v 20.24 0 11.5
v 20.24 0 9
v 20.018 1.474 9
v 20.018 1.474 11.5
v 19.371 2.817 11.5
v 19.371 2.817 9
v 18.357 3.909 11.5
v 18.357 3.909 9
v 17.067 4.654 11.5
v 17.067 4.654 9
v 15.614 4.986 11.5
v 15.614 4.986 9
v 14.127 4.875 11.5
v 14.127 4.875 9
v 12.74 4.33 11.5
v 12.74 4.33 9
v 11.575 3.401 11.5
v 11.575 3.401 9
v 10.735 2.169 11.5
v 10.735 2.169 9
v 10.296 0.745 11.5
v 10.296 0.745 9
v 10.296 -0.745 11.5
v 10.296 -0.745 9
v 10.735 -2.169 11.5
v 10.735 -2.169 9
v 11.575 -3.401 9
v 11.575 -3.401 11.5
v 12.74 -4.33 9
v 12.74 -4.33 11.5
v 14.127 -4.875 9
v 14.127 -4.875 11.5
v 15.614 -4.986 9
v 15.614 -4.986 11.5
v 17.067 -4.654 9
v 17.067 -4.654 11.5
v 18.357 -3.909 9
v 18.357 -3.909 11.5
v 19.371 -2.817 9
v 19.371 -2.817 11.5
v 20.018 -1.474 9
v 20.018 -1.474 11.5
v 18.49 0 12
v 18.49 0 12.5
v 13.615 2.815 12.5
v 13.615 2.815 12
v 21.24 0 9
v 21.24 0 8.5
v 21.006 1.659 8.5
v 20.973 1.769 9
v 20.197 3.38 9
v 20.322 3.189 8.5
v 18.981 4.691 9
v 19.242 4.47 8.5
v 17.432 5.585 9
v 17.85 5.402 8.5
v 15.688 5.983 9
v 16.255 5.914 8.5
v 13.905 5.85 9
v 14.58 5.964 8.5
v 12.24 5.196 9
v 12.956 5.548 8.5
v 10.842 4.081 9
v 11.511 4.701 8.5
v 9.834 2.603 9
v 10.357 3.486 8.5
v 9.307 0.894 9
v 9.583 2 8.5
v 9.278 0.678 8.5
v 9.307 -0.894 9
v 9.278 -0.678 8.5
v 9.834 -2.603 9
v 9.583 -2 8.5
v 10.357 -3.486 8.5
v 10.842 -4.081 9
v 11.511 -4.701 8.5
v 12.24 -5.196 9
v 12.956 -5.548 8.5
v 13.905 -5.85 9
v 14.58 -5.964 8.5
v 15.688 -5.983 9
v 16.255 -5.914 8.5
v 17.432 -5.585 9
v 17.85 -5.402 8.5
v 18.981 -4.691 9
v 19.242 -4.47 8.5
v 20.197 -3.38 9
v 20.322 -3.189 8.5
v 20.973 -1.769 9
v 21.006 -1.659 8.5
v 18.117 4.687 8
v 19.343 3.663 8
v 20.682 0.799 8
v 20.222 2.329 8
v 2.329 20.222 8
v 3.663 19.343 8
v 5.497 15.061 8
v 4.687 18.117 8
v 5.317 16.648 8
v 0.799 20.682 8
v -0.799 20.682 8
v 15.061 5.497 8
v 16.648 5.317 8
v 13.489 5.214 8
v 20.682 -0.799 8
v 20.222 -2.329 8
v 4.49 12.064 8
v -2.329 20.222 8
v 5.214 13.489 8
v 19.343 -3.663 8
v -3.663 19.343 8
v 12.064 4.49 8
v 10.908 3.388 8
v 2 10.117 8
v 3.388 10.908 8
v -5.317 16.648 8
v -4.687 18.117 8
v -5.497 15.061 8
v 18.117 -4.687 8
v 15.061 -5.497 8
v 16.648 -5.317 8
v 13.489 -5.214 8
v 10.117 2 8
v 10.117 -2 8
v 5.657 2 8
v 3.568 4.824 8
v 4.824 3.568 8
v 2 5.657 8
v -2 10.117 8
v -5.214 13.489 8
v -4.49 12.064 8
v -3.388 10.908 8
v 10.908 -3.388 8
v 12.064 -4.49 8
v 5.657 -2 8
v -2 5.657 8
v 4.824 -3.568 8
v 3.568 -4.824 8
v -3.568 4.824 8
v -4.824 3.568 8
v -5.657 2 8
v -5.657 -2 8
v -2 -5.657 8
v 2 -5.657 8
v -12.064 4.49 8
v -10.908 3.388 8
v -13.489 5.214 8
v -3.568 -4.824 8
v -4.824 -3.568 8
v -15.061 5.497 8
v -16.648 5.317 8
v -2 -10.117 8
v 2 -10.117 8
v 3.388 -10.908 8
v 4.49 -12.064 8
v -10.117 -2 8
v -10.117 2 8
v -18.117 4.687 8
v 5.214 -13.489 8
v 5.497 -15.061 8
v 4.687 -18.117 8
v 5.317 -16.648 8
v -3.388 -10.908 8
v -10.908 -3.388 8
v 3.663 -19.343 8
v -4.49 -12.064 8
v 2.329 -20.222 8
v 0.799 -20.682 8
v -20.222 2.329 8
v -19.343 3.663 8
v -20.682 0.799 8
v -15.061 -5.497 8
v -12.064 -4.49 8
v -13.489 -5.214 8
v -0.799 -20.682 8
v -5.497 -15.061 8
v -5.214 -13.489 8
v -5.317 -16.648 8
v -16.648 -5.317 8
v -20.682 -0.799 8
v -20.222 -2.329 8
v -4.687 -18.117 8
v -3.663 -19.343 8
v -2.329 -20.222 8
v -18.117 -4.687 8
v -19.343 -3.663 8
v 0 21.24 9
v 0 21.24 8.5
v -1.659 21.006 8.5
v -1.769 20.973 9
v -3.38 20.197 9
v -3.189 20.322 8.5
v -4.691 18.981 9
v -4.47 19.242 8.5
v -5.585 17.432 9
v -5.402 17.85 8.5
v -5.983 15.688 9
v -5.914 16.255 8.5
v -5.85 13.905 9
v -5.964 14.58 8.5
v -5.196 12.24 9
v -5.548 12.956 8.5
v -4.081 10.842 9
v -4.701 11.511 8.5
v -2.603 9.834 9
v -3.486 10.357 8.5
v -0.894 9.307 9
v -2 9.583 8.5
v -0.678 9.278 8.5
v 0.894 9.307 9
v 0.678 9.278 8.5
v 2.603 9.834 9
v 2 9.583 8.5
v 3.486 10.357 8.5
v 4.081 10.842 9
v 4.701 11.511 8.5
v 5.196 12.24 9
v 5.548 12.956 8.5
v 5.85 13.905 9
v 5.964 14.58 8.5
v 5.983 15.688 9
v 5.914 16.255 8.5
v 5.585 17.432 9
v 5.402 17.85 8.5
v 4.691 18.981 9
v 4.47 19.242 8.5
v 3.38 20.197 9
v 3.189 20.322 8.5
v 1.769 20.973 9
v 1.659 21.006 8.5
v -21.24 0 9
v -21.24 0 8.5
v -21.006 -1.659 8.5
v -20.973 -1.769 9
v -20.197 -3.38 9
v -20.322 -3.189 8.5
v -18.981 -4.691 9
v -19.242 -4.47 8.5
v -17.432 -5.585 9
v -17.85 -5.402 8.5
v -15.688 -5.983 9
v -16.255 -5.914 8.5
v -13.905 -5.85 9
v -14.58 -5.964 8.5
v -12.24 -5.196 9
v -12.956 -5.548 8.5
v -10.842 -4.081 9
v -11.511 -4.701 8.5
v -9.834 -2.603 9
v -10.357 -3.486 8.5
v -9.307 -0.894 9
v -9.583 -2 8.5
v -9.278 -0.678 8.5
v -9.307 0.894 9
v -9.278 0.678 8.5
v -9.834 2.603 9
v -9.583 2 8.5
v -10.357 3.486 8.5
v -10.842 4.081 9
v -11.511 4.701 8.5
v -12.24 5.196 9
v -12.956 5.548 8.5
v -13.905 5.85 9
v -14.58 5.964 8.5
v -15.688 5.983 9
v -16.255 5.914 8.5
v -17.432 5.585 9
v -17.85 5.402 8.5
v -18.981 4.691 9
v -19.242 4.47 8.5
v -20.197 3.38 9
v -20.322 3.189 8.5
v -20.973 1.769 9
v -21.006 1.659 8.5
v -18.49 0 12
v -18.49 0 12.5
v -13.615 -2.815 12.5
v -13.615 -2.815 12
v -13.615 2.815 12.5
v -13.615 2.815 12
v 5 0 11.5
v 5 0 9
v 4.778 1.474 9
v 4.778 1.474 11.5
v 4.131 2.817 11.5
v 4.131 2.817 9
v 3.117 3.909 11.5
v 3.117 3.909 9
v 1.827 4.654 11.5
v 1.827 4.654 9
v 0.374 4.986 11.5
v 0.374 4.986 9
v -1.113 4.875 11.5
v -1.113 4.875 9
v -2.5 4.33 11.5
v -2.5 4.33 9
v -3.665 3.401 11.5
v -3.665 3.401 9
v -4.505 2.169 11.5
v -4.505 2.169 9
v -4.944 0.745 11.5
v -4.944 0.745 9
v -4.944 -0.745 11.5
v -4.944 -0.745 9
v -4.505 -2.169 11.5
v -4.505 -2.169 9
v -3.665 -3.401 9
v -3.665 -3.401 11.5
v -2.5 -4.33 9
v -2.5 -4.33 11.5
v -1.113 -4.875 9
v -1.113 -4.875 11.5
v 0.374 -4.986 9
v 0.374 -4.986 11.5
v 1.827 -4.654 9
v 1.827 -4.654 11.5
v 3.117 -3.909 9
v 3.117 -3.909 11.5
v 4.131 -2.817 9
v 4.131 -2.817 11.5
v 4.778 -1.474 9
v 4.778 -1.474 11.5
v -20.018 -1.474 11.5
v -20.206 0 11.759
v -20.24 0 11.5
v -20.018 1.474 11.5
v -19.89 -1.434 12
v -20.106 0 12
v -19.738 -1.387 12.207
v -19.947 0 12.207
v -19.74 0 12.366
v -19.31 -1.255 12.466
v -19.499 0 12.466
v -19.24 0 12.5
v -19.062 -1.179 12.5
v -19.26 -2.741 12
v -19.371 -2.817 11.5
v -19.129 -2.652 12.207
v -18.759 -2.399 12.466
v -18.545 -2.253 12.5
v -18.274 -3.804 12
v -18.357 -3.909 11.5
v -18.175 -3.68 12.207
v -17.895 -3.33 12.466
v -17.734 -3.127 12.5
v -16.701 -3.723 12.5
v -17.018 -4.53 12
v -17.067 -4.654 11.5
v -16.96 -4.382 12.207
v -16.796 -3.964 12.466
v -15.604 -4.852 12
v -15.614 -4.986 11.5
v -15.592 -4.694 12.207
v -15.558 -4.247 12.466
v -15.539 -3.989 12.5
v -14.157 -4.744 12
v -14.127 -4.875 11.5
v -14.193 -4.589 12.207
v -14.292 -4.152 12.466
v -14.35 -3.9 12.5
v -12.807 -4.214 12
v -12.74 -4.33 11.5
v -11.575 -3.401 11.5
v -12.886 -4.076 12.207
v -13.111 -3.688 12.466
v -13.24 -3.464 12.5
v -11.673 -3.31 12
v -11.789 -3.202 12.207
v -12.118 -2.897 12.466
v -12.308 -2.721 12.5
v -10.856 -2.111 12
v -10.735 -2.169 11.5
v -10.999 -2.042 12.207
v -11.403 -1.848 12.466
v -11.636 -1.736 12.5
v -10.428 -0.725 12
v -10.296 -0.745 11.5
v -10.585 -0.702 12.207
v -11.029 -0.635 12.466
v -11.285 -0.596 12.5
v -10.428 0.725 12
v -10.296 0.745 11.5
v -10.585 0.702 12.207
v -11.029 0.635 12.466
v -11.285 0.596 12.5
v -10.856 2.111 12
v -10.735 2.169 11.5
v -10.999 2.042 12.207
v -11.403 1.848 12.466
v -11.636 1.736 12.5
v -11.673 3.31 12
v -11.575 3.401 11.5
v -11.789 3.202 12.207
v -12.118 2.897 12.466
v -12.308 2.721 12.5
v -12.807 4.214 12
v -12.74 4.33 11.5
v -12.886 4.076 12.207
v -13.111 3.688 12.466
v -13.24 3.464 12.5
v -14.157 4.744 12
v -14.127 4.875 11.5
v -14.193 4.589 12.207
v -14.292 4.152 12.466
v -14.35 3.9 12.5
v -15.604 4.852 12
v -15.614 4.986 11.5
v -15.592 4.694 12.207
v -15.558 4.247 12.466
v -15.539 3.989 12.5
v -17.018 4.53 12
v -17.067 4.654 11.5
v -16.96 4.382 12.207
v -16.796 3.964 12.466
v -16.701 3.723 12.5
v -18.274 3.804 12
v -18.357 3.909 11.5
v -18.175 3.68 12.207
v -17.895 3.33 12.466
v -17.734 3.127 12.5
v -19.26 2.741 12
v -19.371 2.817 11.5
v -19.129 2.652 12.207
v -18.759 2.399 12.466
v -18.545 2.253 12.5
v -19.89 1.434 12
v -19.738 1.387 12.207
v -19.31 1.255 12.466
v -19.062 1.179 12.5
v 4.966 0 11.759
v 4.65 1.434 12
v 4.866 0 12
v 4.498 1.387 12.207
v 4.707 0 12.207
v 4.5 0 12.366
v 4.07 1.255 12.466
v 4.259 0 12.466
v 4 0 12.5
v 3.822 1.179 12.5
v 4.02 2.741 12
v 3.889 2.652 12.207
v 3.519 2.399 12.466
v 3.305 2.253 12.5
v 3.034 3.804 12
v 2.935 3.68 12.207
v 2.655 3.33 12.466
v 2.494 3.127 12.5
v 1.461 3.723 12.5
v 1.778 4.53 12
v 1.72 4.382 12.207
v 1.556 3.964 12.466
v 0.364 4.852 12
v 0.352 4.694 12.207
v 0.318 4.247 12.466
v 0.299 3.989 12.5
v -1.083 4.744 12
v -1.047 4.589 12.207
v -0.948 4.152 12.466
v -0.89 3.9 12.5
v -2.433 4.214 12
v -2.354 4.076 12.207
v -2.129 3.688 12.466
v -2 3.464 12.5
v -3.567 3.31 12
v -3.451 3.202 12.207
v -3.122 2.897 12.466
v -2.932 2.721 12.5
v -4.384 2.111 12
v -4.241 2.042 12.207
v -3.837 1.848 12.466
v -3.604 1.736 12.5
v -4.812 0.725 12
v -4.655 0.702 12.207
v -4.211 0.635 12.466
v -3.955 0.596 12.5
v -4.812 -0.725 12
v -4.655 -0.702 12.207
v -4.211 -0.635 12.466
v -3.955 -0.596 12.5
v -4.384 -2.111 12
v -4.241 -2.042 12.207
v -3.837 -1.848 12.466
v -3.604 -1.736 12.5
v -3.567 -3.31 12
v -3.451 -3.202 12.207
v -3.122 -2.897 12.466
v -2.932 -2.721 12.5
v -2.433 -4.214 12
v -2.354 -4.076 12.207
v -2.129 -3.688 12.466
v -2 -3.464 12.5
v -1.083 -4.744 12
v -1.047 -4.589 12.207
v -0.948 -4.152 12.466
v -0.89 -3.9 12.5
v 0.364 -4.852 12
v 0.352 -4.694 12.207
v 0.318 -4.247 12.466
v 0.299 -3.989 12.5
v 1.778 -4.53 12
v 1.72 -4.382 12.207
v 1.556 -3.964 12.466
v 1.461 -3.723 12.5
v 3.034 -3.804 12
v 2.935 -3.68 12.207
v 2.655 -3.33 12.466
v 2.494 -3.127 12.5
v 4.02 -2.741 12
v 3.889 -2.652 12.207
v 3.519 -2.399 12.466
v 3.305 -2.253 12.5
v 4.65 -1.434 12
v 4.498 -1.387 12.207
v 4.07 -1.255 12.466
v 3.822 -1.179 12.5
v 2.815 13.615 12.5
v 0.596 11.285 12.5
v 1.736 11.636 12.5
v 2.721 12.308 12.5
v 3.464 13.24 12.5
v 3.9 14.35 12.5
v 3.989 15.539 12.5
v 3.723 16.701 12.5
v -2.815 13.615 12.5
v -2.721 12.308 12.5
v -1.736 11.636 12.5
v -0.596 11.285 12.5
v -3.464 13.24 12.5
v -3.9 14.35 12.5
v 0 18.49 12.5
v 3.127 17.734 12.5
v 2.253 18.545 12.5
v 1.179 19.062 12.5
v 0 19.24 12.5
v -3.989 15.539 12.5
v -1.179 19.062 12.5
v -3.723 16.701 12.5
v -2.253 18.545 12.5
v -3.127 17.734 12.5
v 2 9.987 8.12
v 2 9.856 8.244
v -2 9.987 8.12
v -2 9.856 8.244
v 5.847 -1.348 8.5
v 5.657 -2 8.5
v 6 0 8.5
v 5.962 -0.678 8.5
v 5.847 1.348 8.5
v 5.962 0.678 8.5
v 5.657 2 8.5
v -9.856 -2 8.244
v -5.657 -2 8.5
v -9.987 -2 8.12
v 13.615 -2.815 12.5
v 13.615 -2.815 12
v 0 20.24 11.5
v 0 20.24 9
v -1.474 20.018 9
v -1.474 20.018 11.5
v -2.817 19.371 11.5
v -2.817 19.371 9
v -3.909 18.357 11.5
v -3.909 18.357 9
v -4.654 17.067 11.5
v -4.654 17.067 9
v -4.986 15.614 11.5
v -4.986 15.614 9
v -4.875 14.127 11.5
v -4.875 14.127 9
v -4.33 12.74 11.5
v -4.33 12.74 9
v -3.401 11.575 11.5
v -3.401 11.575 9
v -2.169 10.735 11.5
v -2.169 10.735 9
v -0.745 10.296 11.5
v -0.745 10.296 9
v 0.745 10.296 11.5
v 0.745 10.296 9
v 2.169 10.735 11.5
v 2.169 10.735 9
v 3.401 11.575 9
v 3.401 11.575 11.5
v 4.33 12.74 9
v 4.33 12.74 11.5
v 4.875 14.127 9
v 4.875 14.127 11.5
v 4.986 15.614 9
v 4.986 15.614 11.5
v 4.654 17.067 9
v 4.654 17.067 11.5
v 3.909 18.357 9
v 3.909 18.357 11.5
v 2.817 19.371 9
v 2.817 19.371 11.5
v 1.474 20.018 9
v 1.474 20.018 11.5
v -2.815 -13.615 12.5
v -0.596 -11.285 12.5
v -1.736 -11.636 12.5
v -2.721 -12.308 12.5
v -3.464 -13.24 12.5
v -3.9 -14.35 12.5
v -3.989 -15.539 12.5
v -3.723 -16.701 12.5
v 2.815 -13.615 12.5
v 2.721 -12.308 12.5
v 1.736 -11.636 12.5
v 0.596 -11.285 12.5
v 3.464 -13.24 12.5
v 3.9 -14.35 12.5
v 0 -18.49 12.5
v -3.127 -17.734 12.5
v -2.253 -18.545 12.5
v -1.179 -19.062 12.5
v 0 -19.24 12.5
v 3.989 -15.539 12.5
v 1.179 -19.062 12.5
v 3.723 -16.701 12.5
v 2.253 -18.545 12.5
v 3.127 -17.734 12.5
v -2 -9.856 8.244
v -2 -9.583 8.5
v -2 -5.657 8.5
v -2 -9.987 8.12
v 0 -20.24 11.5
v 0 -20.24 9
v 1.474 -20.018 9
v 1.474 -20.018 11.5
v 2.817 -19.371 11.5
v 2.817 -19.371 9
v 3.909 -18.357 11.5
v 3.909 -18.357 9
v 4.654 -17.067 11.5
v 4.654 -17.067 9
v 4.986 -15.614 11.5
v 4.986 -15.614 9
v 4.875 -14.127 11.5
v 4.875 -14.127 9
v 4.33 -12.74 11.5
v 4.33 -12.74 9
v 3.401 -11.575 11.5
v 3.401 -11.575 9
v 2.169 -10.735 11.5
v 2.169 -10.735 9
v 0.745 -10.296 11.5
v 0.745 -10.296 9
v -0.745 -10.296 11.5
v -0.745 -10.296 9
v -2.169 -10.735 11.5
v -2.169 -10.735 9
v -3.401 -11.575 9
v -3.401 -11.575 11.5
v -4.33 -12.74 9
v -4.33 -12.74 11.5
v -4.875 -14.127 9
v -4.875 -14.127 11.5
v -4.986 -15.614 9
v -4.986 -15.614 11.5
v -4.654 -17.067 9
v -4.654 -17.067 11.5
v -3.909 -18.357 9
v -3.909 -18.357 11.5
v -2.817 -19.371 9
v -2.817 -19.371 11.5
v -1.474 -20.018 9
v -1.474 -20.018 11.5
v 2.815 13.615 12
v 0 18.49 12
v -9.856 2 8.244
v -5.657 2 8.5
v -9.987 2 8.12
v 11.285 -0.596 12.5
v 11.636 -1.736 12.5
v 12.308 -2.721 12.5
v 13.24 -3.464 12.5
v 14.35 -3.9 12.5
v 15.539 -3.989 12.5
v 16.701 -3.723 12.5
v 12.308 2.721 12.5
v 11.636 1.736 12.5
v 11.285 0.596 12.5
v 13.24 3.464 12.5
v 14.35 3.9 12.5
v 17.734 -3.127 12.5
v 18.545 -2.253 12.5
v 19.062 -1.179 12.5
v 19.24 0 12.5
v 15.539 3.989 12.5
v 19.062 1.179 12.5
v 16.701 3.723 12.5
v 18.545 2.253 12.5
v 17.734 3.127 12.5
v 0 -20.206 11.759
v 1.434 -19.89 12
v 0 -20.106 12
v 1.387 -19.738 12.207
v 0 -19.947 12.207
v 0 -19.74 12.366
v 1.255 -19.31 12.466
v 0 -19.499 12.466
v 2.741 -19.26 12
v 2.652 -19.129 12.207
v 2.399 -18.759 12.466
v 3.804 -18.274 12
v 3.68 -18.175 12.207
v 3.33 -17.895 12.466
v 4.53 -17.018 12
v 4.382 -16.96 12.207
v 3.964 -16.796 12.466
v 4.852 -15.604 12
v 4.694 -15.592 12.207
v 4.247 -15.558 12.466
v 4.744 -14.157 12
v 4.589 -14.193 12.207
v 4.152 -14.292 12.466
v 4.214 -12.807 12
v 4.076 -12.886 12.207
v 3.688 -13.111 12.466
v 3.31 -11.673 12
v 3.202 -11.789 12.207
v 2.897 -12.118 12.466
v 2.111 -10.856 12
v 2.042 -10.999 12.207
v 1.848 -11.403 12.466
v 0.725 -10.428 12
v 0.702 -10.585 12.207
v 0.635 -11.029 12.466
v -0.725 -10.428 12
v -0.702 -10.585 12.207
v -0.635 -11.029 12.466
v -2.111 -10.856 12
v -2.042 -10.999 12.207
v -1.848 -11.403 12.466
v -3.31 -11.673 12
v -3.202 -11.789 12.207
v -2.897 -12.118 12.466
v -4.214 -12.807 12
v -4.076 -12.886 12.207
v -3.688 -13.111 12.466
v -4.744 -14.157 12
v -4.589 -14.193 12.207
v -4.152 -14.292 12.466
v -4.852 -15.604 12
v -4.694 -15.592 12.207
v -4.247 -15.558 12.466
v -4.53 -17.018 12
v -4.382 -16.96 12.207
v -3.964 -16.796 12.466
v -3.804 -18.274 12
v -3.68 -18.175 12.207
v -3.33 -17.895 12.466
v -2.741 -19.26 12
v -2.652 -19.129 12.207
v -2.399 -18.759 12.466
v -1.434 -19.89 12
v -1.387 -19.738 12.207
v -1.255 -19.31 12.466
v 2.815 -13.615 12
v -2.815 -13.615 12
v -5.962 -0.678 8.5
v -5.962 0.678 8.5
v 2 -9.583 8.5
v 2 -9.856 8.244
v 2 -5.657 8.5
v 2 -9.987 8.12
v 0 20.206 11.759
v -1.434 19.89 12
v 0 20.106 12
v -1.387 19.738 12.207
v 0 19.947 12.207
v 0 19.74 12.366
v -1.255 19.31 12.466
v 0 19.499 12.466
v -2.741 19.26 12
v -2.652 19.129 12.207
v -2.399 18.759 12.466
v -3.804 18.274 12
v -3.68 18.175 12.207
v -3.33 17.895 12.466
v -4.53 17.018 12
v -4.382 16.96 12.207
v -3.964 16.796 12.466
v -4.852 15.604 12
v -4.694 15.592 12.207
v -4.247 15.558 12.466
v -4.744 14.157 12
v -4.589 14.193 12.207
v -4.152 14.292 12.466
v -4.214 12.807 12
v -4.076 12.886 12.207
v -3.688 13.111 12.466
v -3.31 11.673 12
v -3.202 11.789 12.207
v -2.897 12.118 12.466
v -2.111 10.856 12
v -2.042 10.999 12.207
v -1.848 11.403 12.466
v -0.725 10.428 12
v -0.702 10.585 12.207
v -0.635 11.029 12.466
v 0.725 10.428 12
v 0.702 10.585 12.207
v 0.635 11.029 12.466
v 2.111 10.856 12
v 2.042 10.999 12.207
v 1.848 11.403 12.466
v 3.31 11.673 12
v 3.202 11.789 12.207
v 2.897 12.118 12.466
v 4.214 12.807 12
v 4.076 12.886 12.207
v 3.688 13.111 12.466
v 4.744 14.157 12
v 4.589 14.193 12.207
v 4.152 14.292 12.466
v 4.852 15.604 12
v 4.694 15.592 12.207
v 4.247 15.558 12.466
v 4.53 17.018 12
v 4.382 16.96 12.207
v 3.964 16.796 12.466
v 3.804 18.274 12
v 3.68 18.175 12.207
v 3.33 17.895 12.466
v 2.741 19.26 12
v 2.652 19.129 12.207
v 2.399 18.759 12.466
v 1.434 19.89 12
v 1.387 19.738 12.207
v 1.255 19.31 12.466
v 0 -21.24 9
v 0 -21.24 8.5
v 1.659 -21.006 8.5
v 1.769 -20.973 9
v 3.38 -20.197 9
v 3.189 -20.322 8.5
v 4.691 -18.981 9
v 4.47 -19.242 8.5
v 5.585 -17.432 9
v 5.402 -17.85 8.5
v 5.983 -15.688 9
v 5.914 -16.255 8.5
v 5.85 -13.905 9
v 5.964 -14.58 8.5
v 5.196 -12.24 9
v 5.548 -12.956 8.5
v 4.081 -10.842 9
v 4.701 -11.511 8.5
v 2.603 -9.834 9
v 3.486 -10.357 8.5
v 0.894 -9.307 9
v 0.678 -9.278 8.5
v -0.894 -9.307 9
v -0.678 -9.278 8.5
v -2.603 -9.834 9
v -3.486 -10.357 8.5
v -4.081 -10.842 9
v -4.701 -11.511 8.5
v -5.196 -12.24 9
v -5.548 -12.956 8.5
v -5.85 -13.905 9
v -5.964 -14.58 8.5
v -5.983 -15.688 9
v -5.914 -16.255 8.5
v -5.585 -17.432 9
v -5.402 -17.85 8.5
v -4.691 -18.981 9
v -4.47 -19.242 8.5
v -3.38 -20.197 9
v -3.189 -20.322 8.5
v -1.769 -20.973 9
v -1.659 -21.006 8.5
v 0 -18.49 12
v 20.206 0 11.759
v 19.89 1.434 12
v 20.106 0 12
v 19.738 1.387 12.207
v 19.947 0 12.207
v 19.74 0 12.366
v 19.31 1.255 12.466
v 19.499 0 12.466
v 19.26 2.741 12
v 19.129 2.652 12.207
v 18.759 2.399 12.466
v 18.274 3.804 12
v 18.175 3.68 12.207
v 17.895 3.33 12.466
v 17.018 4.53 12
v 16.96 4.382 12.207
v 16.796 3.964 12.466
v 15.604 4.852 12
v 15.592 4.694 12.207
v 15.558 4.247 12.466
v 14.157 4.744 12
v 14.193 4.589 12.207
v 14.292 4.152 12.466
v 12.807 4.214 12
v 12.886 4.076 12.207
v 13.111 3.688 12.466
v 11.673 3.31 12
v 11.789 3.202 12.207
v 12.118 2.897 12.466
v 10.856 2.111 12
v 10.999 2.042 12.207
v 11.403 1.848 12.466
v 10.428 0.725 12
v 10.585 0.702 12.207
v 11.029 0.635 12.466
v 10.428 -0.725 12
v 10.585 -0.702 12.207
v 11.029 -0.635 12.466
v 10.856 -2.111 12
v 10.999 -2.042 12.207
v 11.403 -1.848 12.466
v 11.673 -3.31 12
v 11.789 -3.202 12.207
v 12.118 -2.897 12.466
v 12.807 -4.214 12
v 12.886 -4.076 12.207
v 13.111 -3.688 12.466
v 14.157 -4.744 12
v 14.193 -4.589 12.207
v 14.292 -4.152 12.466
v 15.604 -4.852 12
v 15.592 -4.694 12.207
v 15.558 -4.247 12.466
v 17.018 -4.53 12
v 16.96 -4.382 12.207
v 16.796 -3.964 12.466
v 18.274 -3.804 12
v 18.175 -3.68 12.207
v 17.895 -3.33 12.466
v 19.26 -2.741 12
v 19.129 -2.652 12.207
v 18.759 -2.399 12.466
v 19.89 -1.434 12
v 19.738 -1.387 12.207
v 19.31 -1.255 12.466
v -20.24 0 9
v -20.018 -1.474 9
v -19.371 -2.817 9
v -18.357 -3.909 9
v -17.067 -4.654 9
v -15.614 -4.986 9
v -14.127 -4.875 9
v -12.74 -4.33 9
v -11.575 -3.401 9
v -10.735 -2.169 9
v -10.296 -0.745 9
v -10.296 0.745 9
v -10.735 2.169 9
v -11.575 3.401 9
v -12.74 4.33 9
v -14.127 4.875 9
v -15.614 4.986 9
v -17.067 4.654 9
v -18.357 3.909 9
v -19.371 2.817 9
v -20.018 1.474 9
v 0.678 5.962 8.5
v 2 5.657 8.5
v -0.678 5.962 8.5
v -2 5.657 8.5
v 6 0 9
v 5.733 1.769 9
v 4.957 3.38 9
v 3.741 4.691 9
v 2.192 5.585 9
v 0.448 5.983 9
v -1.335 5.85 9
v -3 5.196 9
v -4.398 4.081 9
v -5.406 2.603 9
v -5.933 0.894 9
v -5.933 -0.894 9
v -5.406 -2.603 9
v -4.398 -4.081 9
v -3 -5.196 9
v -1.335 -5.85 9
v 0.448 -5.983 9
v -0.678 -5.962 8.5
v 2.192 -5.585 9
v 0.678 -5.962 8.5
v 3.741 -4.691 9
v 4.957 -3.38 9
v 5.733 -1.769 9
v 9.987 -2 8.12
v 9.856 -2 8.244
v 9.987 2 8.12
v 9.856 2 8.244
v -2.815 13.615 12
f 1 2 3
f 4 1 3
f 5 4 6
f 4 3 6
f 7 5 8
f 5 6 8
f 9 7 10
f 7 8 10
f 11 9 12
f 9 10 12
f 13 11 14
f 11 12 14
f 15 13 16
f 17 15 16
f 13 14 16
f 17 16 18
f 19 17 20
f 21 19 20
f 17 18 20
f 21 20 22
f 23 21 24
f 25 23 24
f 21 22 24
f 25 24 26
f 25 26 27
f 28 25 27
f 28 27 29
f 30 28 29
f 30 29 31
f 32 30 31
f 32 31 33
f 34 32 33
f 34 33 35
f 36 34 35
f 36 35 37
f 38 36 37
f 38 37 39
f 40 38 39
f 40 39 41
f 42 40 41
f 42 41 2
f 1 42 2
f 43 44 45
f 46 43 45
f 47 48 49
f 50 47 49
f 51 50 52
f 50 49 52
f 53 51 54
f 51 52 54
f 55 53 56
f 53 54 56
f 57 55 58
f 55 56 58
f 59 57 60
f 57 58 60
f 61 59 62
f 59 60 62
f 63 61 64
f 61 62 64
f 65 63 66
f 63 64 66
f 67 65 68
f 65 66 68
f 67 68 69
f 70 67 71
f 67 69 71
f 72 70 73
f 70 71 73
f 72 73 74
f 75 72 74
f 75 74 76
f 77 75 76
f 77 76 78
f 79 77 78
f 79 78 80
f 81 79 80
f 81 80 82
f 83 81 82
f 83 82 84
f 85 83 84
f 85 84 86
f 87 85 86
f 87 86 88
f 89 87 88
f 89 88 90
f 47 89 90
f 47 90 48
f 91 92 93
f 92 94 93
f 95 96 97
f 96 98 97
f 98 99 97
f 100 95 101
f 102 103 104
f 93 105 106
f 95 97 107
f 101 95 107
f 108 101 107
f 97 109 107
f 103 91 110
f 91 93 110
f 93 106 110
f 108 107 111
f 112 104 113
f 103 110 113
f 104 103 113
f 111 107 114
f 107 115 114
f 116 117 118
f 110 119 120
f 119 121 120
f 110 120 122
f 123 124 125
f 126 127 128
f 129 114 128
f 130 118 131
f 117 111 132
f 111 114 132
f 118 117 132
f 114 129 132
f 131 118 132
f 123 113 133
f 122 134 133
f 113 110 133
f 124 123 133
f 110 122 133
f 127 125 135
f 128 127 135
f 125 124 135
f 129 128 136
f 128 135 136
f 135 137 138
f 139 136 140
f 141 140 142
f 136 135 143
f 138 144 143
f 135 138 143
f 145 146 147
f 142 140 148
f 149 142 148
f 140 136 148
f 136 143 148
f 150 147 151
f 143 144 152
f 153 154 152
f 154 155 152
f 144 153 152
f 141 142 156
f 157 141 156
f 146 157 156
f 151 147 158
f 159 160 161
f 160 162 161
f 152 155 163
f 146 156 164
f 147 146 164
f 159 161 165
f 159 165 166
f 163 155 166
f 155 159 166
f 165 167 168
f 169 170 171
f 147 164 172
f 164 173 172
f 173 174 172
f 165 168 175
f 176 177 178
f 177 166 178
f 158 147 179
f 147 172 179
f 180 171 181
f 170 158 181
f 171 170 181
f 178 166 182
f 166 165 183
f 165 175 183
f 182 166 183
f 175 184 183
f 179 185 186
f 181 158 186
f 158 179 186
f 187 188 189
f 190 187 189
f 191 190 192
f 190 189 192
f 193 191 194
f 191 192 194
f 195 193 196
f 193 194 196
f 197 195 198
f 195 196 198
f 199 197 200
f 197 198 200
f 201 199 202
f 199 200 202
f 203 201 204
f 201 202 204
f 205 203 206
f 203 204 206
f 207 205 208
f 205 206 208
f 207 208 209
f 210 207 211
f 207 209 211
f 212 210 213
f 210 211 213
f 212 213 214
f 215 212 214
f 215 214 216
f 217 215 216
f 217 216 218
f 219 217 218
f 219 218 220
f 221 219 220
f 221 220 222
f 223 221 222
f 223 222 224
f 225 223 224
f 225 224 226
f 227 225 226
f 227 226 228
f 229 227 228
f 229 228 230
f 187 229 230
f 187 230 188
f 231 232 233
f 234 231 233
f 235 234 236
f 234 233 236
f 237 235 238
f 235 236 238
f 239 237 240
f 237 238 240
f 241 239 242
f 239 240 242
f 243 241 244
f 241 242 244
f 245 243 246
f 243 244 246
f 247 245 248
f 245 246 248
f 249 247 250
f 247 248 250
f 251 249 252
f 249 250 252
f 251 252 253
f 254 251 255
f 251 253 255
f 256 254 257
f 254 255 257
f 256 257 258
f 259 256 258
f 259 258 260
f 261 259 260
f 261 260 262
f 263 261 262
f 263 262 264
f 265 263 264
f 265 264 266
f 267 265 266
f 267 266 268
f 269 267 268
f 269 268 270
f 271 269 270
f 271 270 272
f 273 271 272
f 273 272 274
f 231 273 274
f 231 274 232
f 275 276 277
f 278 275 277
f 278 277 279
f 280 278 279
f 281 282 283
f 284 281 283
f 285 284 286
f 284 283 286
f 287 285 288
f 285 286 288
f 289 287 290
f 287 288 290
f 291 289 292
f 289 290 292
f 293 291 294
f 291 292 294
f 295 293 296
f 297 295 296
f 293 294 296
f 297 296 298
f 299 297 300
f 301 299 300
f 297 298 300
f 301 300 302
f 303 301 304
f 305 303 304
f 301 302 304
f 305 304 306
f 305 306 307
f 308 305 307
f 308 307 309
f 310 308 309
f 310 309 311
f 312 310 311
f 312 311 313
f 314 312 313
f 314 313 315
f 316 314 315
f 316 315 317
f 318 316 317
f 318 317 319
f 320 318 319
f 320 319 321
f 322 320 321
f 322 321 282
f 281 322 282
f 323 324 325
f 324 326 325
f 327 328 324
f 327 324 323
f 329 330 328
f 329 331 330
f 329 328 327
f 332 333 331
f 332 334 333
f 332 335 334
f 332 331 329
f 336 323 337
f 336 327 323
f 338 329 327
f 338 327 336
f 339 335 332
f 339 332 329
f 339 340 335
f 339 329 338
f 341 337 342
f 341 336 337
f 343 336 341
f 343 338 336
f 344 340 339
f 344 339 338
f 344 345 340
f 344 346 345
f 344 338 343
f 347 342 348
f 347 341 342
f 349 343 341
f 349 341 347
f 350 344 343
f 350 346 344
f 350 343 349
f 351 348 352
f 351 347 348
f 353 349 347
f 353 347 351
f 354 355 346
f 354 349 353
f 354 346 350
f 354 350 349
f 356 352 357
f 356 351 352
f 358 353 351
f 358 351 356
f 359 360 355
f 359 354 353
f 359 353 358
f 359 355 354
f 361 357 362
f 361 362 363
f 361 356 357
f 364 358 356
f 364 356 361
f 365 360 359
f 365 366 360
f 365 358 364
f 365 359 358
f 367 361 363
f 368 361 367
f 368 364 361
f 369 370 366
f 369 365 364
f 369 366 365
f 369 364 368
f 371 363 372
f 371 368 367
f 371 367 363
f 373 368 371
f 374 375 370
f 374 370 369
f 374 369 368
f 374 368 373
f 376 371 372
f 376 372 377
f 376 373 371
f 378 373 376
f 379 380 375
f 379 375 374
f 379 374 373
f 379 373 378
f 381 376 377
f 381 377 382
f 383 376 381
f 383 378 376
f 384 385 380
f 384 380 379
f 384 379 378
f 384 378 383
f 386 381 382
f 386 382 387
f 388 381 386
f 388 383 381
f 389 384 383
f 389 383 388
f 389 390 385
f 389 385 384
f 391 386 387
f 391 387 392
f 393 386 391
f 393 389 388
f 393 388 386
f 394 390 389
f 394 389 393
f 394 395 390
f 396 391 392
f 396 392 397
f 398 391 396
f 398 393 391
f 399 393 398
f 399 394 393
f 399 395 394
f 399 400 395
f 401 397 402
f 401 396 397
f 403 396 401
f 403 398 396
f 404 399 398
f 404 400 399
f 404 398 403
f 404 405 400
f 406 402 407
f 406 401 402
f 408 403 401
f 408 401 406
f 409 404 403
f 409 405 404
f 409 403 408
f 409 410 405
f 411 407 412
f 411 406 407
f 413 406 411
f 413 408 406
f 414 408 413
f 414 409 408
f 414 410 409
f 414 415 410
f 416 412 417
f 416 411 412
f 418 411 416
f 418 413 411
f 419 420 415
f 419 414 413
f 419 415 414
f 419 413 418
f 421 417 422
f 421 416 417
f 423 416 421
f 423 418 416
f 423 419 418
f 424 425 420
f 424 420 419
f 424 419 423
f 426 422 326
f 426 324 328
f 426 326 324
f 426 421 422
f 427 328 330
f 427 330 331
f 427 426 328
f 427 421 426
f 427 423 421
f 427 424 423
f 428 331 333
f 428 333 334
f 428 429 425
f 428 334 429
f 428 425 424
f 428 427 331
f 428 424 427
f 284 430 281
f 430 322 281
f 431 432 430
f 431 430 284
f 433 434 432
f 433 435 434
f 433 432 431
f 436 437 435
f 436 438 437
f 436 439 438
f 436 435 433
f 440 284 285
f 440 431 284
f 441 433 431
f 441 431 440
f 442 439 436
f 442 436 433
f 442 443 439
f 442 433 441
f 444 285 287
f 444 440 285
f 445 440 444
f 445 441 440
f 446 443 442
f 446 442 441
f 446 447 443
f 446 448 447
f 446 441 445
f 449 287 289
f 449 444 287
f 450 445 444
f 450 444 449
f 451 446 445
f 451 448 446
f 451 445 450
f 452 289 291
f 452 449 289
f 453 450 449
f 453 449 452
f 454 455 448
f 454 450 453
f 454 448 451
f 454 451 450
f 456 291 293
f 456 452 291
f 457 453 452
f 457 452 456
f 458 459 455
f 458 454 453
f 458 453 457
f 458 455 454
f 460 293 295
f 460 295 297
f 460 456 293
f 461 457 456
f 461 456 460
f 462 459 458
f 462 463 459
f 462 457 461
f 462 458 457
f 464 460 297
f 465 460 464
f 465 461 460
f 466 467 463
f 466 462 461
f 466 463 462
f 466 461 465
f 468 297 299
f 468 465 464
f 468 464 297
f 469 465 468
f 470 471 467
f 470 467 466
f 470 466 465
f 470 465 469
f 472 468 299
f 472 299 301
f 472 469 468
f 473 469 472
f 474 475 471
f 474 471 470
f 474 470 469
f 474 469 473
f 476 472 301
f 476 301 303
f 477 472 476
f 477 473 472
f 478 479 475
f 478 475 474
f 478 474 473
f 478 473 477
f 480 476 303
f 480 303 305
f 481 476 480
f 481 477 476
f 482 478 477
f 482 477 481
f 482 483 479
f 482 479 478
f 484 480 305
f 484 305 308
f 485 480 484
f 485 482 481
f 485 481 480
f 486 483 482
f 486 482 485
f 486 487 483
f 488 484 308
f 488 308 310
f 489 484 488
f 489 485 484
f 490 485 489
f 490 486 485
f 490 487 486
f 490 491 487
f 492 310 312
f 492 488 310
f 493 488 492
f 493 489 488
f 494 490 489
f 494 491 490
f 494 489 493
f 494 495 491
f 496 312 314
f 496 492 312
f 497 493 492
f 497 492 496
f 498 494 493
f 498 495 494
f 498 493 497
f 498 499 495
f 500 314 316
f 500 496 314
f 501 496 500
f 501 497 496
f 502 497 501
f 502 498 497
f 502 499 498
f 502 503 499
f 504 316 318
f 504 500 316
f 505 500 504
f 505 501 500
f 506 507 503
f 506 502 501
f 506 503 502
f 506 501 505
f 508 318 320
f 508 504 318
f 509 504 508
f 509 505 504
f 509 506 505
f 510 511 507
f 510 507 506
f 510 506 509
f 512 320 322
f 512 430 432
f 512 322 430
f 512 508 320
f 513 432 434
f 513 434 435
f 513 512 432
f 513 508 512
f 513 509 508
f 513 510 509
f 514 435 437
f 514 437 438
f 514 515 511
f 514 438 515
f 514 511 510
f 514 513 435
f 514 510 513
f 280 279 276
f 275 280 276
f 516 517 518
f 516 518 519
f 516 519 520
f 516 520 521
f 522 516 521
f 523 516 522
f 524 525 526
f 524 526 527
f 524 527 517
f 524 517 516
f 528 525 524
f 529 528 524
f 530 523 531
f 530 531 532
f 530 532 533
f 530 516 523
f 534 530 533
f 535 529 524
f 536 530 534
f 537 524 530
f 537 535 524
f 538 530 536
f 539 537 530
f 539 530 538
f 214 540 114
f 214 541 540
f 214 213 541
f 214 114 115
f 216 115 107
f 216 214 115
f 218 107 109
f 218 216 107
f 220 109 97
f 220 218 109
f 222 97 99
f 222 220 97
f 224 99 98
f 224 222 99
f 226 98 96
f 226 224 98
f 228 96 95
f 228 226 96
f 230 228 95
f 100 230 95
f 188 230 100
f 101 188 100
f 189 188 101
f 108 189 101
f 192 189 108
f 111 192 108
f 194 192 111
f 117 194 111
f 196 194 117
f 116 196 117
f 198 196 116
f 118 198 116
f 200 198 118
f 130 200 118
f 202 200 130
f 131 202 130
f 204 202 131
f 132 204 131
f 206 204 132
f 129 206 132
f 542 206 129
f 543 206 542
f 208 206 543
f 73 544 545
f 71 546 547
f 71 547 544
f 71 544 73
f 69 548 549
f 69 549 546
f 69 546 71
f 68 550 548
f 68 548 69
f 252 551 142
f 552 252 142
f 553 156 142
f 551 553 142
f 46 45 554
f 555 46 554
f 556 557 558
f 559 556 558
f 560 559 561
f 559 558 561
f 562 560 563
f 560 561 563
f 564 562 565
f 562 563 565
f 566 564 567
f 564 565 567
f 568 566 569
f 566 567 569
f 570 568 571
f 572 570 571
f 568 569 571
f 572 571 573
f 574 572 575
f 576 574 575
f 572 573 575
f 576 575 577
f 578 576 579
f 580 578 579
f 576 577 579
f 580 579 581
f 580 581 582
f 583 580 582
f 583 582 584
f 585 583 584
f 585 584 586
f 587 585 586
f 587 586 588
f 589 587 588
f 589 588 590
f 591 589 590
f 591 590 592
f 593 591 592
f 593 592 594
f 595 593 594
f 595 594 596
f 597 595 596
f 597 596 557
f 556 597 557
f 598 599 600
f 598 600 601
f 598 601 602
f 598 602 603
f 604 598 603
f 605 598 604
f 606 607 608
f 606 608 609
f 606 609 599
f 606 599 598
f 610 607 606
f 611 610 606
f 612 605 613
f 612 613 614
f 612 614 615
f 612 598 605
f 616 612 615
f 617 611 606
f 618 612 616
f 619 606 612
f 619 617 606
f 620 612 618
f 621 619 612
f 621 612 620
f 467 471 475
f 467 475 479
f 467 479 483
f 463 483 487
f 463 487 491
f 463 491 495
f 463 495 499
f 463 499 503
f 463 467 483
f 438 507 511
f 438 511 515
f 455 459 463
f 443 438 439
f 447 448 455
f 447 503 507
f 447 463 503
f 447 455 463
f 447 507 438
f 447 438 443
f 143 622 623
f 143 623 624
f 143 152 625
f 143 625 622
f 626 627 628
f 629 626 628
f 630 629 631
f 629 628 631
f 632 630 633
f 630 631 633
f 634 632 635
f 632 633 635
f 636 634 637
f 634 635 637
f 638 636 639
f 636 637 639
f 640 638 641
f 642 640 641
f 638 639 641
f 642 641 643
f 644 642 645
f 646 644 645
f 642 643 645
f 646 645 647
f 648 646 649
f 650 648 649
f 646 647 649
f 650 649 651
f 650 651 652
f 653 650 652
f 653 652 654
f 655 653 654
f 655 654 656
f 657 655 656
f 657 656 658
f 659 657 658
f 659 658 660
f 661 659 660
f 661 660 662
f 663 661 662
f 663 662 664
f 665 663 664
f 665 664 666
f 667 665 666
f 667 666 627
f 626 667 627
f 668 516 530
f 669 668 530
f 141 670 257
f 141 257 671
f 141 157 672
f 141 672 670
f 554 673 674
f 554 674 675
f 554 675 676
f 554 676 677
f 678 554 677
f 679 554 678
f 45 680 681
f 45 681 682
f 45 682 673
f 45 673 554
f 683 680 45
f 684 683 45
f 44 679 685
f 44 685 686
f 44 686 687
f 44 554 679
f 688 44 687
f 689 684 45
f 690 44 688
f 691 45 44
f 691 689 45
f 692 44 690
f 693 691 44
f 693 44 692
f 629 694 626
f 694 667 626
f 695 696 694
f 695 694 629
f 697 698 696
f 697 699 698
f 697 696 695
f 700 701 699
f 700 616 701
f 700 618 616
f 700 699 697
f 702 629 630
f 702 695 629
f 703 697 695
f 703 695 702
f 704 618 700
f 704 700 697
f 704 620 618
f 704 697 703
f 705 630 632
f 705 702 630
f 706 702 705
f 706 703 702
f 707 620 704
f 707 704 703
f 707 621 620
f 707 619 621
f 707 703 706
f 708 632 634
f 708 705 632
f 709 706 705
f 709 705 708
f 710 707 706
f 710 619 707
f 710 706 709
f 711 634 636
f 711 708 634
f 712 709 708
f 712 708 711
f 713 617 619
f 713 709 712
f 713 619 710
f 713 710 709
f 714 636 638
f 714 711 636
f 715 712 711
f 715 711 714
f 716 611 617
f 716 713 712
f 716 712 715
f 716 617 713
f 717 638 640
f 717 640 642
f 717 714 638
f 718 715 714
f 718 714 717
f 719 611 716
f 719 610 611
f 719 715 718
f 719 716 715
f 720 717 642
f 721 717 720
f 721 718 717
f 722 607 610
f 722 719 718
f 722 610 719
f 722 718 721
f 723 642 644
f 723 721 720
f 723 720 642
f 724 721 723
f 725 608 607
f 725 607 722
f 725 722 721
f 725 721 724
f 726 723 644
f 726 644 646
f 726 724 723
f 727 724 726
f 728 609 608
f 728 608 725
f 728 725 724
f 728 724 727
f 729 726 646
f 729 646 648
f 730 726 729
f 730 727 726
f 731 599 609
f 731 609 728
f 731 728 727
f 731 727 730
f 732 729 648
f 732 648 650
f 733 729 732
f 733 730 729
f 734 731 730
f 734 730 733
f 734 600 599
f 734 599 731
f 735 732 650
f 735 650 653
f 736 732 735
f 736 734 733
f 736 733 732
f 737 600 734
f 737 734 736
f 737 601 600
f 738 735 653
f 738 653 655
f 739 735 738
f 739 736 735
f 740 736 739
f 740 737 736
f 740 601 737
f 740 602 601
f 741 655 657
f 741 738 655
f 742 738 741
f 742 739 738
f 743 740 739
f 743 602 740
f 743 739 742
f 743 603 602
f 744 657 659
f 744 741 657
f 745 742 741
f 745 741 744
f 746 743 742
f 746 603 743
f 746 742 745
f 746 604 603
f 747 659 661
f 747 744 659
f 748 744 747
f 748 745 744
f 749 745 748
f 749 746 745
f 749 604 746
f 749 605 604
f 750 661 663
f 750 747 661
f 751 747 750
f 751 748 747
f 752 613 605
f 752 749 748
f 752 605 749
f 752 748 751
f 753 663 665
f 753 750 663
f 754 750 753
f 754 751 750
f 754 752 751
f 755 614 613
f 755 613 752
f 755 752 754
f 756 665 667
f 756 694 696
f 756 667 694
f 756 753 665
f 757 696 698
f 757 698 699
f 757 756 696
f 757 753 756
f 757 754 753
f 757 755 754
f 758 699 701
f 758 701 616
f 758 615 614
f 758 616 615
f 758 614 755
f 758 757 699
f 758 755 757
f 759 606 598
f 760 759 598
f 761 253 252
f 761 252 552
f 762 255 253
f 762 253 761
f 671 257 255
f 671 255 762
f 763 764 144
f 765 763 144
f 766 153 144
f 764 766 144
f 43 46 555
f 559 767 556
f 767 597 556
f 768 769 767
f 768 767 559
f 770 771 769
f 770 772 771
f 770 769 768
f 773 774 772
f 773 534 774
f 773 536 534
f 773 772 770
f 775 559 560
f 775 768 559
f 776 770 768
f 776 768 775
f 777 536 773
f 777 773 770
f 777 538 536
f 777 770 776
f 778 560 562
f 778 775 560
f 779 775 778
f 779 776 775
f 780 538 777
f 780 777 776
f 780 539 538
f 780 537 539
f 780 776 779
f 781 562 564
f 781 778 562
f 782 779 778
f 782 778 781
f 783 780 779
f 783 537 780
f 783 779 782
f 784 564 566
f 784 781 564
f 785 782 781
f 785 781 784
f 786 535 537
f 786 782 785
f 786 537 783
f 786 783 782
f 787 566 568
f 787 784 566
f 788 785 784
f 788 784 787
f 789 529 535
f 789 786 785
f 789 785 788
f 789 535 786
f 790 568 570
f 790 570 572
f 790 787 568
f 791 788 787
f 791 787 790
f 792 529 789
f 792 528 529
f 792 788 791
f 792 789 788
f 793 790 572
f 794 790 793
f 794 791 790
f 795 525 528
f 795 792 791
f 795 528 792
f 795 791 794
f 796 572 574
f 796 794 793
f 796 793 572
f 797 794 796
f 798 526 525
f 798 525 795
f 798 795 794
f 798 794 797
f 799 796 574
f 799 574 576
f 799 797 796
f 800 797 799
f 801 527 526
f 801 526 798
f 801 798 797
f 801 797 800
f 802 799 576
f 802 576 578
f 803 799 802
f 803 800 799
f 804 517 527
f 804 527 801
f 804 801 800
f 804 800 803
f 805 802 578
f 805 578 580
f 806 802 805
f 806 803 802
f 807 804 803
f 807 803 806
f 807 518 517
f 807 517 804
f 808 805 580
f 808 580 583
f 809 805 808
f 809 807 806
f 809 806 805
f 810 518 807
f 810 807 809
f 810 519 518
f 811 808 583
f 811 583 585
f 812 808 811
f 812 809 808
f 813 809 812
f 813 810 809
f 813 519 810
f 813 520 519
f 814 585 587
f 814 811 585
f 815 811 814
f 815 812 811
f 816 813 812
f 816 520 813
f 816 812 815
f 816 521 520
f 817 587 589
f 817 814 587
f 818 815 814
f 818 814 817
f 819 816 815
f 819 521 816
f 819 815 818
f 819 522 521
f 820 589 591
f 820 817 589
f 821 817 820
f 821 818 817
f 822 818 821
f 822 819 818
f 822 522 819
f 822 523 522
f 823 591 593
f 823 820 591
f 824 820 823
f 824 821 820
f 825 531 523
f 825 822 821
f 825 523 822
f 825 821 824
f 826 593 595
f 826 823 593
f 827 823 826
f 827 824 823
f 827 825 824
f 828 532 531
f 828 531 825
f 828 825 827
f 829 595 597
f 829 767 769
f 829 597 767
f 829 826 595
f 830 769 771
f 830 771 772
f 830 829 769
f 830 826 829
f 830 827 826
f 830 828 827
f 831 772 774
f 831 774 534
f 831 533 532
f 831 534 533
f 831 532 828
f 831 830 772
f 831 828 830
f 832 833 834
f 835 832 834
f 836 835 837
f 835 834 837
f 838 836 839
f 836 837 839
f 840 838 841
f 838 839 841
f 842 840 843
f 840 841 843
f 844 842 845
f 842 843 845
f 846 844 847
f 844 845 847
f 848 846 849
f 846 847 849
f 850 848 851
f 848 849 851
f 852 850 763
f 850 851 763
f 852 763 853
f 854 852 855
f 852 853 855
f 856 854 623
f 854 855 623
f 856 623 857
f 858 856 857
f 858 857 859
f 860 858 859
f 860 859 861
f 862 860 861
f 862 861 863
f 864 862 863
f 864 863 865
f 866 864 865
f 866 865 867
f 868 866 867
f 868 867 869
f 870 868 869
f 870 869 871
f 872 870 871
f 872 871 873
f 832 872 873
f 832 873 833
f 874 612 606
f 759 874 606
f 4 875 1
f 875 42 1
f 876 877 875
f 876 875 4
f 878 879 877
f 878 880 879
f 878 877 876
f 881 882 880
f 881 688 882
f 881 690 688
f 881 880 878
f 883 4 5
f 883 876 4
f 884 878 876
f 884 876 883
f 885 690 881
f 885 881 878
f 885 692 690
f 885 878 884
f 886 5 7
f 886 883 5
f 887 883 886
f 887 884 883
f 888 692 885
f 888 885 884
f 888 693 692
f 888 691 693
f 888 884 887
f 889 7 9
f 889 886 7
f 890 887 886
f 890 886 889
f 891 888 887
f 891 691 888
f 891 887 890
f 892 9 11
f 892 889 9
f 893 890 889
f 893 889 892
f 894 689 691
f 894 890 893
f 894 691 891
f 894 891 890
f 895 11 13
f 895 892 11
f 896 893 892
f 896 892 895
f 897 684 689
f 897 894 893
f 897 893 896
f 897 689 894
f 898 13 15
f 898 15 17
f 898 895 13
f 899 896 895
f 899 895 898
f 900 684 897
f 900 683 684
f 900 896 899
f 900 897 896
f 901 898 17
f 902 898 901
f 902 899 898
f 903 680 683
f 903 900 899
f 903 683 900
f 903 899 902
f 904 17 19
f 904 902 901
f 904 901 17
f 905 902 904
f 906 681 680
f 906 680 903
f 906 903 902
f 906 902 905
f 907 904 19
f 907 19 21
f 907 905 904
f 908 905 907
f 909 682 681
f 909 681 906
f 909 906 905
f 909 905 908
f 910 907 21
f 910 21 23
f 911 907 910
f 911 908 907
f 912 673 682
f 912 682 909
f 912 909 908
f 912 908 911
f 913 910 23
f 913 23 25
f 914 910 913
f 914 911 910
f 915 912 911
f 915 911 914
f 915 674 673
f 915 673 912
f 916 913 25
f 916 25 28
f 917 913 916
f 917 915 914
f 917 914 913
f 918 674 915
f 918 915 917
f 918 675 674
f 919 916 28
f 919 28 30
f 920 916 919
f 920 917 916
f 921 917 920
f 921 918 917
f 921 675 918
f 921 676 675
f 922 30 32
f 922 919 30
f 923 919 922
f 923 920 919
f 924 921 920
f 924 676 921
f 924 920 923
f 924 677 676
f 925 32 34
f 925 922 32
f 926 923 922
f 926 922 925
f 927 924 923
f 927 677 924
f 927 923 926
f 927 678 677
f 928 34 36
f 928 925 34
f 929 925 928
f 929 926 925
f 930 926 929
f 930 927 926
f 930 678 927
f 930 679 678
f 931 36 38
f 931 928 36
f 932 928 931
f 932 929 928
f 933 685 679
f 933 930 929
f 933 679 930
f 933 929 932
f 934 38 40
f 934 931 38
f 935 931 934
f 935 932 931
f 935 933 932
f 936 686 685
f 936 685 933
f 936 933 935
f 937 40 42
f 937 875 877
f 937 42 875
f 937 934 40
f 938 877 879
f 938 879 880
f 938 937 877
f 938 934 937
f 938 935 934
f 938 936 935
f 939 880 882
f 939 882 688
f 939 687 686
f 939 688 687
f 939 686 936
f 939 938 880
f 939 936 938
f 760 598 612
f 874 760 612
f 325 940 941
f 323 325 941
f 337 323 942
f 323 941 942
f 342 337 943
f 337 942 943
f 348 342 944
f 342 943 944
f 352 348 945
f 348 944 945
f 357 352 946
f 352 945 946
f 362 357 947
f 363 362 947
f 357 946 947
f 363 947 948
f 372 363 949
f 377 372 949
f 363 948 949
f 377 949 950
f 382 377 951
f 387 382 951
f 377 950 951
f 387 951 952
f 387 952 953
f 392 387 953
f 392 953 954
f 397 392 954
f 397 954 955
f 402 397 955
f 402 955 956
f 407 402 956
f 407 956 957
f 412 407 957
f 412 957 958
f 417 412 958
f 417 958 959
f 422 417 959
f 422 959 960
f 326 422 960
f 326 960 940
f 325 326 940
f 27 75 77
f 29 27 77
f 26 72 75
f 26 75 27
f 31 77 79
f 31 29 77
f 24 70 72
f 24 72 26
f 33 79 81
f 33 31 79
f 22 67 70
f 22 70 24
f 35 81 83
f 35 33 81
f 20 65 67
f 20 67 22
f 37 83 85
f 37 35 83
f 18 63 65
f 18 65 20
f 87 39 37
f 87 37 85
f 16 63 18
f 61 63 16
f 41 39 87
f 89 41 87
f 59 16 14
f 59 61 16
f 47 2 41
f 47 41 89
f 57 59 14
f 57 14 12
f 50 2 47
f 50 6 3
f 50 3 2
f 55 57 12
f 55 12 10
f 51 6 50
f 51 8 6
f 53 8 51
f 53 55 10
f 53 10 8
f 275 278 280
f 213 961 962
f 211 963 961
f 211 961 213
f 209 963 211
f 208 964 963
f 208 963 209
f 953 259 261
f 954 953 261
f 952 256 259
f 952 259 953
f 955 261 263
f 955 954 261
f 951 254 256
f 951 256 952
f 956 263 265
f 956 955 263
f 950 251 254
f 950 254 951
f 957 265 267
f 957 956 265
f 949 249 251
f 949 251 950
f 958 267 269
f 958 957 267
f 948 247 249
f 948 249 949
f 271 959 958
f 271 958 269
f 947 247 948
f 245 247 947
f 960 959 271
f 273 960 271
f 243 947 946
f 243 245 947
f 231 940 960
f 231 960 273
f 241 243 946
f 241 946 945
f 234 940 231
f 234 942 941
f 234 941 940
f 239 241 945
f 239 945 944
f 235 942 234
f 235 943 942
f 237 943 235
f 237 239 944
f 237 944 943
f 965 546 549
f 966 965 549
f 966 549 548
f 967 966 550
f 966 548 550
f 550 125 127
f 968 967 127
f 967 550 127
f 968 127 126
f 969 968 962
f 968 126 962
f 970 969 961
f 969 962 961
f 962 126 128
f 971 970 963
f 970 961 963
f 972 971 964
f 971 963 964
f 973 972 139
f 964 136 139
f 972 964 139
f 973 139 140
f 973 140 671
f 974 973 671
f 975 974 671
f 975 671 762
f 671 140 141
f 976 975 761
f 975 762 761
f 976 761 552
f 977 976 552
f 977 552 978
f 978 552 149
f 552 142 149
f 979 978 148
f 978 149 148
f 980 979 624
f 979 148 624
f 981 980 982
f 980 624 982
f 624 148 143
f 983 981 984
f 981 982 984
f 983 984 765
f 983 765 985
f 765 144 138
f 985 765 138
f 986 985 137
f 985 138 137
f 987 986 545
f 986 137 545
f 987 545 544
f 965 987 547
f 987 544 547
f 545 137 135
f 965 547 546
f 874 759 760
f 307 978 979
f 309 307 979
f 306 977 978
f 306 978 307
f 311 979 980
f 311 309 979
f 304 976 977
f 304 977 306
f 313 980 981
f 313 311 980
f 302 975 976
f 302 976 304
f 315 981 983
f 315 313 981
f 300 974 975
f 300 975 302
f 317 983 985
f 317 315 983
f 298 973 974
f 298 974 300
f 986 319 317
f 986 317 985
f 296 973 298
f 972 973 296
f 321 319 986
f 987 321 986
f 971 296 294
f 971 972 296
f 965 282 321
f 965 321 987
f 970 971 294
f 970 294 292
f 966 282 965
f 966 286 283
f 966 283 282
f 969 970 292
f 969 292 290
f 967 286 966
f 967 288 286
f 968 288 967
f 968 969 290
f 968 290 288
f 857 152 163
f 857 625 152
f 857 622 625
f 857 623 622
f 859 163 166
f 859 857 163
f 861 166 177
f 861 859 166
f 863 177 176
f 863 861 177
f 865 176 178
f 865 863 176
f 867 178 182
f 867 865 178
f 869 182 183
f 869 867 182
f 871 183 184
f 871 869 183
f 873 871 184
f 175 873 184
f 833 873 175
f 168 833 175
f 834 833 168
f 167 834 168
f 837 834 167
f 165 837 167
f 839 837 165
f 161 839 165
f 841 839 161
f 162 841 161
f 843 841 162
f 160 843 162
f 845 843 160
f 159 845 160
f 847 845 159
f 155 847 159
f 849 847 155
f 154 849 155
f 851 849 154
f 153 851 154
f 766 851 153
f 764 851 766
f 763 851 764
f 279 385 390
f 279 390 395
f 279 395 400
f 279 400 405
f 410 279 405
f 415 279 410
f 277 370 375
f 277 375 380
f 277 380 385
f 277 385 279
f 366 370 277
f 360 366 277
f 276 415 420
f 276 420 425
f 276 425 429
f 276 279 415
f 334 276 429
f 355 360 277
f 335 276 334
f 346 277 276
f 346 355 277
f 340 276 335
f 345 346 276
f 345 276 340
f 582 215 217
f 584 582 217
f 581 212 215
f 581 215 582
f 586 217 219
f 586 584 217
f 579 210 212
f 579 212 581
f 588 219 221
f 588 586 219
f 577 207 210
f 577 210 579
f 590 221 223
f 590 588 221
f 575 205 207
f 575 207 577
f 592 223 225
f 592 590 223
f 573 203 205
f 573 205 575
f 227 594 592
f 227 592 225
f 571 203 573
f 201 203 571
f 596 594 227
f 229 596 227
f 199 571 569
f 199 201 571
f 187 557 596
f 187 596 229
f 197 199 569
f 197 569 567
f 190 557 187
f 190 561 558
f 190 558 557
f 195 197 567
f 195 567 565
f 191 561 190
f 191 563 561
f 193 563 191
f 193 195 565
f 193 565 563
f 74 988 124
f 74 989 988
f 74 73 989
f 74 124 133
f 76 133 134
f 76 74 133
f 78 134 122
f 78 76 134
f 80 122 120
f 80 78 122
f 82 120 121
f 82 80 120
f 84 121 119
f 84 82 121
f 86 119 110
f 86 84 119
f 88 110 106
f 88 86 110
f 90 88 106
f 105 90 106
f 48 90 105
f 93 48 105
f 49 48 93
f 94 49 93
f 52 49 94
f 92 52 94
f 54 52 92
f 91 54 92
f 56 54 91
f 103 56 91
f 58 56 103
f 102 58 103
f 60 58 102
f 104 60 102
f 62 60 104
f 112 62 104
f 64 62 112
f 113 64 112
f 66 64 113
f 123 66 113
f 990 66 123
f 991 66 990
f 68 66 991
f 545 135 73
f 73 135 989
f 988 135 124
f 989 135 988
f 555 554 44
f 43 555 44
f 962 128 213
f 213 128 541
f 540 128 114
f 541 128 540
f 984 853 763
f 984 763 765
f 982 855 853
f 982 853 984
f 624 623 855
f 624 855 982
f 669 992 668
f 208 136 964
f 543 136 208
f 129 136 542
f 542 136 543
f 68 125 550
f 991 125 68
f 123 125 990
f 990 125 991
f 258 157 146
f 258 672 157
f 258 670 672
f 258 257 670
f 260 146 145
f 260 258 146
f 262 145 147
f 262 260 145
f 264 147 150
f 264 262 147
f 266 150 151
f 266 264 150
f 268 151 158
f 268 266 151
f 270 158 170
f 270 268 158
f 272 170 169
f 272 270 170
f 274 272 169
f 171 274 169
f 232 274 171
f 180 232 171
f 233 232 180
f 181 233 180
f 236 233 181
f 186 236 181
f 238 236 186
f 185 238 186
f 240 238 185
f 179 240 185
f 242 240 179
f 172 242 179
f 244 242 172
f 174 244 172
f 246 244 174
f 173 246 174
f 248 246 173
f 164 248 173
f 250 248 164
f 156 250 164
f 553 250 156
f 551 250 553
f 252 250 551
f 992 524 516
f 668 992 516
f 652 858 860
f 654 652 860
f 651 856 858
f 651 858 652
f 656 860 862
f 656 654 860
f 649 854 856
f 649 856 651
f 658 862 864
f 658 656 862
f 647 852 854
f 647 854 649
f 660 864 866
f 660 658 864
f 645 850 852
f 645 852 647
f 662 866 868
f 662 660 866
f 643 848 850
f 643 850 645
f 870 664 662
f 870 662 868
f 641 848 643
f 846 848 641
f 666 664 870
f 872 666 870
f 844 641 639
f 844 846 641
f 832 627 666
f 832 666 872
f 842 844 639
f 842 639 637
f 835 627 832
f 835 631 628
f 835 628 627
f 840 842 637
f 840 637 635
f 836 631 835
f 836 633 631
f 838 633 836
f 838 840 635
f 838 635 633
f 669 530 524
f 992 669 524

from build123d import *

# Parameters (mm, degrees)
CYLINDER_R             = 5
CYLINDER_DEPTH         = 4.5
FILLET_R               = 1
CYLINDER001_R          = 6
CYLINDER001_DEPTH      = 1
BOX001_W               = 30.48
BOX001_H               = 4
BOX001_DEPTH           = 0.5
BOX001_PLACEMENT_ANGLE = 90
BOX_W                  = 30.48
BOX_H                  = 4
BOX_DEPTH              = 0.5
POCKET_DEPTH           = 0.5
ARRAY_COUNT            = 4
CHAMFER_SIZE           = 0.5


with BuildPart() as button_body_fillet:
    # Cylinder → Cylinder (new body)
    with BuildSketch(Plane.XY.offset(8)):
        Circle(CYLINDER_R)
    extrude(amount=CYLINDER_DEPTH)

    # Fillet
    fillet_edges = [button_body_fillet.edges().sort_by_distance(p)[0] for p in [
        (-5, 0, 12.5),
    ]]
    fillet(fillet_edges, radius=FILLET_R)


with BuildPart() as button_fusion:
    # Cylinder001 → Cylinder001 (new body)
    with BuildSketch(Plane.XY.offset(8)):
        Circle(CYLINDER001_R)
    extrude(amount=CYLINDER001_DEPTH)

    # Fusion: union button-body-fillet
    add(button_body_fillet.part)


with BuildPart() as buttons_forward_backward_union_cube:
    # Box001 → Box001 (new body)
    with BuildSketch(Plane.XY):
        with Locations((15.24, 2)):
            Rectangle(BOX001_W, BOX001_H)
    extrude(amount=BOX001_DEPTH)


with BuildPart() as buttons_forward_backward_union_cube_1:
    # Box001 placement: moved
    add(buttons_forward_backward_union_cube.part.moved(Location((2, -15.24, 8))).rotate(Axis((2, -15.24, 8), (0, 0, 1)), BOX001_PLACEMENT_ANGLE))


with BuildPart() as buttons_left_right_union_cube:
    # Box → Box (new body)
    with BuildSketch(Plane(origin=(-15.24, -2, 8), x_dir=(1, 0, 0), z_dir=(0, 0, 1))):
        with Locations((15.24, 2)):
            Rectangle(BOX_W, BOX_H)
    extrude(amount=BOX_DEPTH)


with BuildPart() as keypad_buttons_printing:
    # Clone base: copy of button-fusion
    add(button_fusion.part)


with BuildPart() as keypad_buttons_printing_1:
    # Clone placement: moved
    add(keypad_buttons_printing.part.moved(Location((15.24, 0, 0))))

    # Sketch → Pocket (cut)
    with BuildSketch(Plane(origin=(15.24, 0, 12.5), x_dir=(1, 0, 0), z_dir=(0, 0, 1))):
        Polygon((-1.625, 2.814583), (-1.625, -2.814583), (3.25, 0), align=None)
    extrude(amount=-POCKET_DEPTH, mode=Mode.SUBTRACT)

    # Array: keypad-buttons (printing) ×4 about axis
    array_axis = Axis((0, 0, 0), (0, 0, 1))


with BuildPart() as keypad_buttons_printing_2:
    add(keypad_buttons_printing_1.part)
    for i in range(1, ARRAY_COUNT):
        add(keypad_buttons_printing_1.part.rotate(array_axis, i * 360 / ARRAY_COUNT))

    # Fusion001: union button-fusion, buttons-forward-backward-union-cube, buttons-left-right-union-cube
    add(button_fusion.part)
    add(buttons_forward_backward_union_cube_1.part)
    add(buttons_left_right_union_cube.part)

    # Chamfer
    chamfer_edges = [keypad_buttons_printing_2.edges().sort_by_distance(p)[0] for p in [
        (16.254612, 5.913591, 8),
        (16.254612, -5.913591, 8),
        (5.913591, -16.254612, 8),
        (-5.913591, -16.254612, 8),
        (-16.254612, -5.913591, 8),
        (-16.254612, 5.913591, 8),
        (-5.913591, 16.254612, 8),
        (5.913591, 16.254612, 8),
    ]]
    chamfer(chamfer_edges, length=CHAMFER_SIZE)


solid = keypad_buttons_printing_2.part
